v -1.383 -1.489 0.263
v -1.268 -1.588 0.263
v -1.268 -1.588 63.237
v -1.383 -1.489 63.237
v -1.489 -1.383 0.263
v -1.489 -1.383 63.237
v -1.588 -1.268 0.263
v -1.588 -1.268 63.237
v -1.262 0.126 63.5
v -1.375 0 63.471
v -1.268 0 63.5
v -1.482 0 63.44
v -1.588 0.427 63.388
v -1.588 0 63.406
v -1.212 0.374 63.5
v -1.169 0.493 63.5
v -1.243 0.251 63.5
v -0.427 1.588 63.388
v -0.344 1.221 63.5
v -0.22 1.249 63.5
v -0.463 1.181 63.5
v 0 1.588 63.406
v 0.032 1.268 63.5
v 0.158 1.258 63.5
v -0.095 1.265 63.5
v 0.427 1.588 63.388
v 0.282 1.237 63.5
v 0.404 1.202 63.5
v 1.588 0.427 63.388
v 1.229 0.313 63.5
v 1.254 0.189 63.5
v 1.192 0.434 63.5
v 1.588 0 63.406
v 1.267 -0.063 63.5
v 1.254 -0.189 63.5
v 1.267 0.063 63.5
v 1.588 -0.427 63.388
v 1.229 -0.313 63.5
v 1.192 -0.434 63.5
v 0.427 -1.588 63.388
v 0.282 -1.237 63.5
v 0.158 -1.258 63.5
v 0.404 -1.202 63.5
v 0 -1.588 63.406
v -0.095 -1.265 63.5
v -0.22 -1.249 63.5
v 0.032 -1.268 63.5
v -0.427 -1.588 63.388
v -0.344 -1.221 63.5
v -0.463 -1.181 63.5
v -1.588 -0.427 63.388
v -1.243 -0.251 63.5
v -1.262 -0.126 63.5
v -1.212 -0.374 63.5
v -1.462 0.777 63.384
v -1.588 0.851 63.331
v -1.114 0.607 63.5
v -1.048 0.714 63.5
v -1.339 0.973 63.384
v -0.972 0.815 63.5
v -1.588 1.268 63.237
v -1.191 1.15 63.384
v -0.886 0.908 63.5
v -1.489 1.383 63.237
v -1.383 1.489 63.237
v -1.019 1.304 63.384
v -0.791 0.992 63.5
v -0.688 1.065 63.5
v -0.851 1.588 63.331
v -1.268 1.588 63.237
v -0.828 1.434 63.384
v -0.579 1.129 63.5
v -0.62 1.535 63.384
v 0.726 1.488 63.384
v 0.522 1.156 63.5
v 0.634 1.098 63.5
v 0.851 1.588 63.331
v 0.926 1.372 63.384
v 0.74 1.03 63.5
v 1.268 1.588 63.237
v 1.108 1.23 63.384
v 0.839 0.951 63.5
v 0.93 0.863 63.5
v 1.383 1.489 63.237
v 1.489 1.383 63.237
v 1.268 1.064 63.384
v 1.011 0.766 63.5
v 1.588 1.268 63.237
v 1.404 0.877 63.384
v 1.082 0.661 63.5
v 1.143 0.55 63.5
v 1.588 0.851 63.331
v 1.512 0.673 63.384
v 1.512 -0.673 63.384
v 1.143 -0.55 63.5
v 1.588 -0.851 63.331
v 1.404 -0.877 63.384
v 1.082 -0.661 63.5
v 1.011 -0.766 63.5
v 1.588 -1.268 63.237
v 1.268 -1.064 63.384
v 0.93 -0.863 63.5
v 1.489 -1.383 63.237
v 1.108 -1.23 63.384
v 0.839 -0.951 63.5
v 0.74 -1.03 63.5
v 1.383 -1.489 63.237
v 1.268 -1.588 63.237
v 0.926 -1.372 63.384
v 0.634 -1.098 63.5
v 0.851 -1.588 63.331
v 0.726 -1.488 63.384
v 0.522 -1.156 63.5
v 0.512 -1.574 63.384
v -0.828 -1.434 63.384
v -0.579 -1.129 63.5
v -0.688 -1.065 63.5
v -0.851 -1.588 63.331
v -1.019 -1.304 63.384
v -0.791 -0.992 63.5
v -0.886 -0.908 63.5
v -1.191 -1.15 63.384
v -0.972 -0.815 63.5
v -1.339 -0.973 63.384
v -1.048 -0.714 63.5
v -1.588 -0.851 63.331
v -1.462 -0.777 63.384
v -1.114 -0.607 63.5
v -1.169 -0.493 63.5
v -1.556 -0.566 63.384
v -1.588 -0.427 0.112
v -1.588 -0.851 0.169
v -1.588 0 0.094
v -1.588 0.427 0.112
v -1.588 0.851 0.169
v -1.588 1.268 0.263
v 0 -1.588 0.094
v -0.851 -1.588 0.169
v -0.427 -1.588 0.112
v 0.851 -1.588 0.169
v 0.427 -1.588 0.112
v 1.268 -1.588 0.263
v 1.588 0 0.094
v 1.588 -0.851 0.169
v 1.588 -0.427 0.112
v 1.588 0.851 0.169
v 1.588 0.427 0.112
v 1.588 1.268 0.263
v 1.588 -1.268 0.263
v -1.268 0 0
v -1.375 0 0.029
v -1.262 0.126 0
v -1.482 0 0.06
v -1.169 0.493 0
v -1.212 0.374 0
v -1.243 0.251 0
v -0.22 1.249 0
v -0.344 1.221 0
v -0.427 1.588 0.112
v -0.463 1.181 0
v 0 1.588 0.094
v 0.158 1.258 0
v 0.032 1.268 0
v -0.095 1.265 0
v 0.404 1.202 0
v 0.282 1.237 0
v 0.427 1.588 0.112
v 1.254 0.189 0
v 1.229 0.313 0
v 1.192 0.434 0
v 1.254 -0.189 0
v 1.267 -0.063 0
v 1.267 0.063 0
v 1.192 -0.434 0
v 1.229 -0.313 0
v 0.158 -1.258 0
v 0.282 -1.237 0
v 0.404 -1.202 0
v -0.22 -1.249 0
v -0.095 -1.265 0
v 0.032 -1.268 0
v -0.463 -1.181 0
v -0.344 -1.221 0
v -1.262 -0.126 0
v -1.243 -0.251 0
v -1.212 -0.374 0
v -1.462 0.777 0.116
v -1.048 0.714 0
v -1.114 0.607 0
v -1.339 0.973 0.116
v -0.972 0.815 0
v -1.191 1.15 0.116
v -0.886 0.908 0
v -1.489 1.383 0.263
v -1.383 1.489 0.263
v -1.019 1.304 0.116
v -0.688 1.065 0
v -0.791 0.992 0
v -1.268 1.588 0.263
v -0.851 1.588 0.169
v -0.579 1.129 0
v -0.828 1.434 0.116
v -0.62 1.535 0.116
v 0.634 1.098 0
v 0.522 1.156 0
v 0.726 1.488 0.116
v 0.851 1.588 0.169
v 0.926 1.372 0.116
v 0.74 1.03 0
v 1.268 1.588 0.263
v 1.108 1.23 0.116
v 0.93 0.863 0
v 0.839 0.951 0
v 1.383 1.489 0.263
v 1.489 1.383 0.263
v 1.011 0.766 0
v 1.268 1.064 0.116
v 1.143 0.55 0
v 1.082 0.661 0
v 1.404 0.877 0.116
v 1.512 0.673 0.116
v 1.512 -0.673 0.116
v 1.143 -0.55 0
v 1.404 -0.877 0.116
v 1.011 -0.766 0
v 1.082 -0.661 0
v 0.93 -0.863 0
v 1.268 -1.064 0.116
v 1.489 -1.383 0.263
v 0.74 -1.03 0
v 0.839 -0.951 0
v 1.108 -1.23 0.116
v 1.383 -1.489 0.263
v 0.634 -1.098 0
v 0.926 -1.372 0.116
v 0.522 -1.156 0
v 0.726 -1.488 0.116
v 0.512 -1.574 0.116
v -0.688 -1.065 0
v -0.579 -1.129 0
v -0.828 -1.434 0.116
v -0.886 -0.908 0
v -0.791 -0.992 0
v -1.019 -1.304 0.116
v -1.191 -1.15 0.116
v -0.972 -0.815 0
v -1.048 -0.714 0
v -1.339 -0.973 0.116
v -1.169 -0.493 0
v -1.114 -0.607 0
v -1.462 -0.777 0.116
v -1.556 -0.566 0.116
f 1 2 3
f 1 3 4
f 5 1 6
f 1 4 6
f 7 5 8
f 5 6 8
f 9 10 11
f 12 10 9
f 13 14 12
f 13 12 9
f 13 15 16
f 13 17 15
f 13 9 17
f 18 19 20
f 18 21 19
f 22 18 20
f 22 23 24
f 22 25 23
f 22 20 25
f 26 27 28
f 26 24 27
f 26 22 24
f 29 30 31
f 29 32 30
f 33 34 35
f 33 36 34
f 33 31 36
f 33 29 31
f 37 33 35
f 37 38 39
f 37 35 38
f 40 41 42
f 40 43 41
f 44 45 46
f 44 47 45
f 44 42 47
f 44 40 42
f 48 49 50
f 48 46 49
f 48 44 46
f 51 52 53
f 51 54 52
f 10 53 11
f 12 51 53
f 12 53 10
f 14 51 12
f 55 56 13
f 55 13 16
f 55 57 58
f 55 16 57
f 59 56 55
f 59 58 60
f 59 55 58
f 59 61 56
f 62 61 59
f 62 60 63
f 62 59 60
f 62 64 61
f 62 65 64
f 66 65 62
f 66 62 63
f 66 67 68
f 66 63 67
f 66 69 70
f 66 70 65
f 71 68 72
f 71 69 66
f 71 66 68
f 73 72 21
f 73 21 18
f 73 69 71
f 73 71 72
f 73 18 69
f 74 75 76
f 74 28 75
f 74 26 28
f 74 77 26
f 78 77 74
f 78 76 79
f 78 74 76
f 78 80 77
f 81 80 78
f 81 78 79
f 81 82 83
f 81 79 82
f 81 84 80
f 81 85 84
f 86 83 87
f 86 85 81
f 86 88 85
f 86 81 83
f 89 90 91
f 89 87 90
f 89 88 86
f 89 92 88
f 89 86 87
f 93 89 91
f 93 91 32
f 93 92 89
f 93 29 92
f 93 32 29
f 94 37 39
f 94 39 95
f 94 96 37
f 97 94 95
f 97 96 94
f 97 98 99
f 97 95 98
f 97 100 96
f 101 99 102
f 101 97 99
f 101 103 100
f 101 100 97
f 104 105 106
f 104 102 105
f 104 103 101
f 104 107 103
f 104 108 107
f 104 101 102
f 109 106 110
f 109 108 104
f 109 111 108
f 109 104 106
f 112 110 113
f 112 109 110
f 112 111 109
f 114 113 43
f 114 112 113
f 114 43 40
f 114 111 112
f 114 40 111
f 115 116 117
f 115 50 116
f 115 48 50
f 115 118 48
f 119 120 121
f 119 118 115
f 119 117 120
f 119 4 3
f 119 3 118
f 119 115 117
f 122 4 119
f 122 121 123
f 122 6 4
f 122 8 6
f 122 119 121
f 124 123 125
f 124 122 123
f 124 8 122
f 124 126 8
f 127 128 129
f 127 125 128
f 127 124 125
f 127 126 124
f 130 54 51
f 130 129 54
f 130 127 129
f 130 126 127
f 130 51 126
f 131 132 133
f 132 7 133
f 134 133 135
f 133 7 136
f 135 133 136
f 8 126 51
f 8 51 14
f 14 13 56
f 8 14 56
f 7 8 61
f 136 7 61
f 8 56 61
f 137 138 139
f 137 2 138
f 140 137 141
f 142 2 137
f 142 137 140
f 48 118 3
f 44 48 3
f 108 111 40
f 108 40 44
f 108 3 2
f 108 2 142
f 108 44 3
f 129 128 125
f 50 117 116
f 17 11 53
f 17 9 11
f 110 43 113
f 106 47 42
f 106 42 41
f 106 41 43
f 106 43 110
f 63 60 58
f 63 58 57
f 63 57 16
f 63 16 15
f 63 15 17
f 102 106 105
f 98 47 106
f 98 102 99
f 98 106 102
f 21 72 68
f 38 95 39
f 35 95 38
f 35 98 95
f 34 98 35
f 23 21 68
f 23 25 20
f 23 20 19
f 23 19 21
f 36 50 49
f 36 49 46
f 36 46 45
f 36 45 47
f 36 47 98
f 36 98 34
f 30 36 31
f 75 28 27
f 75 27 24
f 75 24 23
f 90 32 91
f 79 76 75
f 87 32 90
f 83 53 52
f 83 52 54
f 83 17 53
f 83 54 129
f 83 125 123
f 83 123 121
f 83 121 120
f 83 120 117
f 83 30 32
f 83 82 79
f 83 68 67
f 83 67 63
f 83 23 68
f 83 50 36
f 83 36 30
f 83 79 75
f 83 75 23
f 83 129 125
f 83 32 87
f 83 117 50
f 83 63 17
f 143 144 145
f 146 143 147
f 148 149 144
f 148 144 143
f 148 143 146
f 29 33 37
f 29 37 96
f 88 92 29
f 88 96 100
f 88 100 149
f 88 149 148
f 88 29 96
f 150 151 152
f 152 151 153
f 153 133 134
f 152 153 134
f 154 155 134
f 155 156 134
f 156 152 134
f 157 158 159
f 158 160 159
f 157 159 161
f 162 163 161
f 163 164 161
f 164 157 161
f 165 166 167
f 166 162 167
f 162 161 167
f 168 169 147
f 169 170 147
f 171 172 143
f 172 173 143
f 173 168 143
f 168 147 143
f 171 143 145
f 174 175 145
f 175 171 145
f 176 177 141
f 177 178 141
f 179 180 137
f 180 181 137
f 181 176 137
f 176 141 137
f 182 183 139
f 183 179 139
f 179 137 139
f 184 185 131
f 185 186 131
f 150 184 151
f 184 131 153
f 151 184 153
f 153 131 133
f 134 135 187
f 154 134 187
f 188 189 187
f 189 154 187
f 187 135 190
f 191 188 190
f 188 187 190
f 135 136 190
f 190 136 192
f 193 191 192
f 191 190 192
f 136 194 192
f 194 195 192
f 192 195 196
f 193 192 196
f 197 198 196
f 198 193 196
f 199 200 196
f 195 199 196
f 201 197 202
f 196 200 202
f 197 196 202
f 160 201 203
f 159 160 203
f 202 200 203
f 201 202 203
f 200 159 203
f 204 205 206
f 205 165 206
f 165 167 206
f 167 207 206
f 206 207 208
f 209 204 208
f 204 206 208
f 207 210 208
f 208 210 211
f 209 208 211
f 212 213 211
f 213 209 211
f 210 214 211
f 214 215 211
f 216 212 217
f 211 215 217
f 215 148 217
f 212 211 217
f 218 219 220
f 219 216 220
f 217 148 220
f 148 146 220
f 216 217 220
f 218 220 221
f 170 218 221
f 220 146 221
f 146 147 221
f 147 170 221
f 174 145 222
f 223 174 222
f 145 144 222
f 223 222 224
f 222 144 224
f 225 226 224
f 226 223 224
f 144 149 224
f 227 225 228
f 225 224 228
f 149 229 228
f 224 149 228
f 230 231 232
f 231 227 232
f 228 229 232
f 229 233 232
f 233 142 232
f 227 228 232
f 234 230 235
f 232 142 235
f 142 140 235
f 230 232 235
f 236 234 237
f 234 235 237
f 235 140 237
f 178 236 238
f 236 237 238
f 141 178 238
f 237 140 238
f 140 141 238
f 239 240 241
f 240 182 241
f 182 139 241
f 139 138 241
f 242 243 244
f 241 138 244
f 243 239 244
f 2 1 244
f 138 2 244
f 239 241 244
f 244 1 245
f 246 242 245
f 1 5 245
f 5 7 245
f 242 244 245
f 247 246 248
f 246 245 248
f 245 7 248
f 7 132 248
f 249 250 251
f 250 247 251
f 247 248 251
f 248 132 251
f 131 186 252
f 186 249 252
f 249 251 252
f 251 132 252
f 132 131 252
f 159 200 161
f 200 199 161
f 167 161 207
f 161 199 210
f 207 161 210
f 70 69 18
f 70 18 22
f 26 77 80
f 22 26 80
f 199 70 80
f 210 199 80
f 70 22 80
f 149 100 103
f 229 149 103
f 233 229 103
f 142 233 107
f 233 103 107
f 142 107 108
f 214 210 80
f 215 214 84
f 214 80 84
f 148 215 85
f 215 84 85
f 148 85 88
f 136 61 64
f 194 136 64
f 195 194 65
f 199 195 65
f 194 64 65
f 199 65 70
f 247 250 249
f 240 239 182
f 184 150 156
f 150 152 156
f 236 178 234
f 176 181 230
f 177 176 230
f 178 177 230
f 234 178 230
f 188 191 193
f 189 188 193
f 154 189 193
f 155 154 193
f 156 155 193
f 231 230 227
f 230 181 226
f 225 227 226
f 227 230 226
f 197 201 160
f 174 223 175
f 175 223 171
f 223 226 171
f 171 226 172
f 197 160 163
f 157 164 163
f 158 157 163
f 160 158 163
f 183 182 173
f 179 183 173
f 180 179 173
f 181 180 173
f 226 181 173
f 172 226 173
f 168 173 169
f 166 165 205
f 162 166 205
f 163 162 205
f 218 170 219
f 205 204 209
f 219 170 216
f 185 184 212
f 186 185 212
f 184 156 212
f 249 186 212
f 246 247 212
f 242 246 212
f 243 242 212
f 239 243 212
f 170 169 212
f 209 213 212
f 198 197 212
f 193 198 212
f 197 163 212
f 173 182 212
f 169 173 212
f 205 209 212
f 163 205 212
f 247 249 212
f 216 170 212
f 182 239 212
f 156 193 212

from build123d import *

# Parameters (mm, degrees)
SKETCH1_W           = 3.175
SKETCH1_H           = 3.175
BOSS_EXTRUDE1_DEPTH = 31.75
SKETCH2_OUTSIDE_W   = 11.588
SKETCH2_OUTSIDE_H   = 11.589
SKETCH2_OUTSIDE_R   = 2.032
CUT_EXTRUDE1_DEPTH  = 32.75


with BuildPart() as part:
    # Sketch1 → Boss-Extrude1 (new body)
    with BuildSketch(Plane.XY):
        Rectangle(SKETCH1_W, SKETCH1_H)
    extrude(amount=BOSS_EXTRUDE1_DEPTH)

    # Sketch2 outside → Cut-Extrude1 (cut, through all)
    with BuildSketch(Plane(origin=(0, 0, 0), x_dir=(-1, 0, 0), z_dir=(0, 0, -1))):
        with Locations((0, -0.0005)):
            Rectangle(SKETCH2_OUTSIDE_W, SKETCH2_OUTSIDE_H)
        Circle(SKETCH2_OUTSIDE_R, mode=Mode.SUBTRACT)
    extrude(amount=-CUT_EXTRUDE1_DEPTH, mode=Mode.SUBTRACT)

    # Sketch3 → Cut-Revolve1 (revolve, cut)
    with BuildSketch(Plane(origin=(0, 0, 0), x_dir=(1, 0, 0), z_dir=(0, 1, 0))):
        with BuildLine():
            Line((-5.053685963, -4.40273269), (-5.053685963, 5.740530545))
            Line((-5.053685963, 5.740530545), (0, 5.740530545))
            Line((0, 5.740530545), (0, 0.160877736))
            ThreePointArc((0, 0.160877736), (-3.404639553, -1.148866368), (-5.053685963, -4.40273269))
        make_face()
    revolve(axis=Axis((0, 0, 31.75), (0, 0, -1)), mode=Mode.SUBTRACT)

    # Mirror1: part across plane


with BuildPart() as part_1:
    add(part.part)
    add(part.part.mirror(Plane(origin=(0, 0, 31.75), x_dir=(1, 0, 0), z_dir=(0, 0, -1))))


solid = part_1.part
